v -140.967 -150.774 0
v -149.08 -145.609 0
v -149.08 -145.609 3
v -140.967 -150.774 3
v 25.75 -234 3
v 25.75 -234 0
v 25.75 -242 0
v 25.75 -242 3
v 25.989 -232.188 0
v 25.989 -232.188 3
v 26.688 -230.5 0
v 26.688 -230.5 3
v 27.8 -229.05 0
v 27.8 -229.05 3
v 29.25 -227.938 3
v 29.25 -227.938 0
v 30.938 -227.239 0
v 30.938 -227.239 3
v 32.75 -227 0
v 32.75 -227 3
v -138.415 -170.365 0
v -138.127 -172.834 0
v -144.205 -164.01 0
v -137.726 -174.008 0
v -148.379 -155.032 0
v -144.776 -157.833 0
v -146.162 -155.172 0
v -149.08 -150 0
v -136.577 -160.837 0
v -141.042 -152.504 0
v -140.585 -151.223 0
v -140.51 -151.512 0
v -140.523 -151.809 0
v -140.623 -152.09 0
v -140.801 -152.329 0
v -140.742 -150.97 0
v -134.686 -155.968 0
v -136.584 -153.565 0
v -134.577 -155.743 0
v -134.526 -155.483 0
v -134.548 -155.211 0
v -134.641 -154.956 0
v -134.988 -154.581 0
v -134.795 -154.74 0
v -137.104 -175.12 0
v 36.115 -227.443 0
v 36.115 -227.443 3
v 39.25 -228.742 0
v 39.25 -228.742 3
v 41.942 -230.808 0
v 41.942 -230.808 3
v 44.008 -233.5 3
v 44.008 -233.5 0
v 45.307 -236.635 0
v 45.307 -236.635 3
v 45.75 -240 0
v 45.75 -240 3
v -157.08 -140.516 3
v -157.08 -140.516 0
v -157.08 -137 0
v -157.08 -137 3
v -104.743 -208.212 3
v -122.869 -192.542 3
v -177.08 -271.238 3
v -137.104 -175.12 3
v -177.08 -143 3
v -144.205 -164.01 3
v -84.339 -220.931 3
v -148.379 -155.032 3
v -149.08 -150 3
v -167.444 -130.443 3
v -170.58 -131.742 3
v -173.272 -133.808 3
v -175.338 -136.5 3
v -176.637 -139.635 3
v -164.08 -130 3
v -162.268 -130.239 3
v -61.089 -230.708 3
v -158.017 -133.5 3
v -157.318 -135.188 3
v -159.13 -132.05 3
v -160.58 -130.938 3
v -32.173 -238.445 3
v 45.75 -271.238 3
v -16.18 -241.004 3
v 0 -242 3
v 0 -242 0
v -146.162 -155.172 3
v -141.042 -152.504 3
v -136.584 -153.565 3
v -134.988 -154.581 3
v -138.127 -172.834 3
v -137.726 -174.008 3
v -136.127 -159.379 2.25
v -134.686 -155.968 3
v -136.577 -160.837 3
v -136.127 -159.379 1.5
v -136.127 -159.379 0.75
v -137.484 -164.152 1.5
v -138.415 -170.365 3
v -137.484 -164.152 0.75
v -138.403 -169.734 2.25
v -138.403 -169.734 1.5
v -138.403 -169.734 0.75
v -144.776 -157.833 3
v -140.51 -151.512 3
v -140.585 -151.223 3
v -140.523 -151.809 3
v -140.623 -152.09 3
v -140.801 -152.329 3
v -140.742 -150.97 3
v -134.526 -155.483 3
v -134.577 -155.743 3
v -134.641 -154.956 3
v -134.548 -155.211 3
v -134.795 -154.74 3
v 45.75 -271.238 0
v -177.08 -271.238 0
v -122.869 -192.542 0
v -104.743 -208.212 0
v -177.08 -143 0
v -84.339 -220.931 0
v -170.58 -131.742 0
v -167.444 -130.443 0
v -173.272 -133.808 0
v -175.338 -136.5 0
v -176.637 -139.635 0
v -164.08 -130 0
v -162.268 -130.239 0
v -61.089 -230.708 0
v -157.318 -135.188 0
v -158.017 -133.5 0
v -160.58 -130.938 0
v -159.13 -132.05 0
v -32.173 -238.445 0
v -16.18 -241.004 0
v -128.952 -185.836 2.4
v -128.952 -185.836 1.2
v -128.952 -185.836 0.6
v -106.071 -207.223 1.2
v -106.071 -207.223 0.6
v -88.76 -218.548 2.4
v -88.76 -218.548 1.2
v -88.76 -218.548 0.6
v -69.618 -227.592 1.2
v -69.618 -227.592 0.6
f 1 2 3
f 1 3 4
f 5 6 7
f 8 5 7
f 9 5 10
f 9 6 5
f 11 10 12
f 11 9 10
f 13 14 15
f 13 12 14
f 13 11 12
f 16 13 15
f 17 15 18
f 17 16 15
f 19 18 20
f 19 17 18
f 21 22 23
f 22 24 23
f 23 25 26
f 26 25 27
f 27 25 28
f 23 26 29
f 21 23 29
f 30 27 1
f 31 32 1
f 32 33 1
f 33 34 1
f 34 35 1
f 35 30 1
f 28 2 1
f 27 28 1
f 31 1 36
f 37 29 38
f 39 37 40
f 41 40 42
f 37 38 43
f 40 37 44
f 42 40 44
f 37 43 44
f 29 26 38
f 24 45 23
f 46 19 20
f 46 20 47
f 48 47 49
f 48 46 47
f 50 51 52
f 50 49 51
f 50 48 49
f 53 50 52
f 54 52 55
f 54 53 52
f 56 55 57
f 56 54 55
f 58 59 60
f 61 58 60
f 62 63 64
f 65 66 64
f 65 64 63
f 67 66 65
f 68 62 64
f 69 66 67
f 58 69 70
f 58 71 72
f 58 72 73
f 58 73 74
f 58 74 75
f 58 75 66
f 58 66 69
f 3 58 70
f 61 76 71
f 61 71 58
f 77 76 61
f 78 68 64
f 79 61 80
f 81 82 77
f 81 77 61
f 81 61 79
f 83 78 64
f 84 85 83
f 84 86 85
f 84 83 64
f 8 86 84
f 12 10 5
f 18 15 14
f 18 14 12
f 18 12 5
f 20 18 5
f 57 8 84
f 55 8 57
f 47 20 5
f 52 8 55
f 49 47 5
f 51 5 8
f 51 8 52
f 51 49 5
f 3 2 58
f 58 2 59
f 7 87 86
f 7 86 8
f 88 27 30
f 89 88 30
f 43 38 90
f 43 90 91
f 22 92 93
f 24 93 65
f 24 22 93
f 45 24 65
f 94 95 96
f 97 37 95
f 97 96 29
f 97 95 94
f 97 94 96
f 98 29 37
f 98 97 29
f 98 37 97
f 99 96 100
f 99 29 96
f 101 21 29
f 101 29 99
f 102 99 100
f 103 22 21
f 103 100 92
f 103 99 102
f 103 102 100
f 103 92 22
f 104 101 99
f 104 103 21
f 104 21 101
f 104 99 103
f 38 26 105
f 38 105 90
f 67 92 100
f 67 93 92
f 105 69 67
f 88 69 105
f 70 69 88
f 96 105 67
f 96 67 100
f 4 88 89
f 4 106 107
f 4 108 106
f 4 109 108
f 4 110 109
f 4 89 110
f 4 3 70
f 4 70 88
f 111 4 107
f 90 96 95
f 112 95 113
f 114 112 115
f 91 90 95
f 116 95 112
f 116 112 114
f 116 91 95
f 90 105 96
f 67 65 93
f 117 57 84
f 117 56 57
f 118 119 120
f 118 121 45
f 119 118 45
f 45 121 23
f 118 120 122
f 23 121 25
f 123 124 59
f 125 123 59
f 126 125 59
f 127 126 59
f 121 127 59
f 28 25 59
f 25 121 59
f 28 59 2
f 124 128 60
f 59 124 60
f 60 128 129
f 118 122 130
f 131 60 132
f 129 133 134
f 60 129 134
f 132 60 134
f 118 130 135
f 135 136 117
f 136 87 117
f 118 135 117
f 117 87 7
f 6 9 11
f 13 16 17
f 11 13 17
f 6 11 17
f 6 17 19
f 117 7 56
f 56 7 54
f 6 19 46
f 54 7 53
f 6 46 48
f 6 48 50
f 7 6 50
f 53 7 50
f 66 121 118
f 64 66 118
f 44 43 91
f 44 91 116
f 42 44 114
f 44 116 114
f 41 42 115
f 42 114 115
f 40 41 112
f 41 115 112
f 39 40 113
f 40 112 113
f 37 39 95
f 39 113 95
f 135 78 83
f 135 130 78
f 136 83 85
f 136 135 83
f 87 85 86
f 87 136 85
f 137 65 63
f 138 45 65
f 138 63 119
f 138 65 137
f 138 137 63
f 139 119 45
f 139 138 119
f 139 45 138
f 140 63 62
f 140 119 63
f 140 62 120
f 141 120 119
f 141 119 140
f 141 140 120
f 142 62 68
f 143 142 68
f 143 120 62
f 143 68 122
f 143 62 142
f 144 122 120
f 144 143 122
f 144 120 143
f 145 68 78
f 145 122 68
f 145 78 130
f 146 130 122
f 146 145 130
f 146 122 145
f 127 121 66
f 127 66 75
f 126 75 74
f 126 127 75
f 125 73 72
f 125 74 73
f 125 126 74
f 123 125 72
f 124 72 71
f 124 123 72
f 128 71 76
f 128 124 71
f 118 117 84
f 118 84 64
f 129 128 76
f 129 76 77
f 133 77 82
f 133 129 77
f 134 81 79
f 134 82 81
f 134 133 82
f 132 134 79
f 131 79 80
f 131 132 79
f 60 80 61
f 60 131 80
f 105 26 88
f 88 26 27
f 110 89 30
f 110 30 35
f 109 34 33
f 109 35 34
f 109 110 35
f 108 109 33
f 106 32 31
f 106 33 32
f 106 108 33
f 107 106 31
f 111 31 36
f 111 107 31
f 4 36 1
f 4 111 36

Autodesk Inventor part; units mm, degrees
ref_plane "YZ Plane" through (0, 0, 0) normal (1, 0, 0) x (0, 1, 0)
ref_plane "XZ Plane" through (0, 0, 0) normal (0, 1, 0) x (-1, 0, 0)
ref_plane "XY Plane" through (0, 0, 0) normal (0, 0, 1) x (1, 0, 0)
sketch "Sketch3" plane through (0, 0, 0) normal (0, 0, 1) x (1, 0, 0)
  circle A0 centre (368.0481, 50) radius 50 construction
  line L0 (368.0481, 0) -> (514.9541, 0) construction
  line L1 (368.0481, 50) -> (514.9541, 50) construction
  line L2 (368.0481, 100) -> (514.9541, 100) construction
  line L3 (368.0481, 50) -> (343.0481, 6.6987) construction
  line L4 (368.0481, 50) -> (324.7469, 25) construction
  line L5 (368.0481, 50) -> (324.7469, 75) construction
  line L6 (343.0481, 93.3013) -> (368.0481, 50) construction
  line L7 (393.0481, 93.3013) -> (368.0481, 50) construction
  line L8 (411.3494, 75) -> (368.0481, 50) construction
  line L9 (411.3494, 25) -> (368.0481, 50) construction
  line L10 (393.0481, 6.6987) -> (368.0481, 50) construction
  line L11 (368.0481, 0) -> (368.0481, 100) construction
  line L12 (418.0481, 50) -> (368.0481, 50) construction
  line L13 (341.8682, 0) -> (341.8682, 100) construction
  line L14 (315.6883, 0) -> (315.6883, 100) construction
  line L15 (289.5083, 0) -> (289.5083, 100) construction
  line L16 (263.3284, 0) -> (263.3284, 100) construction
  line L17 (237.1485, 0) -> (237.1485, 100) construction
  line L18 (210.9685, 0) -> (210.9685, 100) construction
  line L19 (184.7886, 0) -> (184.7886, 100) construction
  line L20 (158.6086, 0) -> (158.6086, 100) construction
  circle A1 centre (315.6883, 50) radius 50 construction
  circle A2 centre (341.8682, 50) radius 50 construction
  circle A3 centre (289.5083, 50) radius 50 construction
  circle A4 centre (263.3284, 50) radius 50 construction
  circle A5 centre (237.1485, 50) radius 50 construction
  circle A6 centre (210.9685, 50) radius 50 construction
  line L21 (393.0481, 6.6987) -> (514.9541, 6.6987) construction
  line L22 (411.3494, 25) -> (514.9541, 25) construction
  line L23 (411.3494, 75) -> (514.9541, 75) construction
  line L24 (411.3494, 75) -> (514.9541, 75) construction
  line L25 (393.0481, 93.3013) -> (514.9541, 93.3013) construction
  line L26 (358.9895, 75) -> (339.5083, 50) construction
  line L27 (339.5083, 50) -> (306.6297, 25) construction
  line L28 (306.6297, 25) -> (262.1485, 6.6987) construction
  line L29 (262.1485, 6.6987) -> (210.9685, 0) construction
  line L30 (105.4843, -12.0642) -> (105.4843, 125.3083) construction
  line L31 (25.75, 0) -> (25.75, 23)
  line L32 (45.75, 17) -> (45.75, -21.2379)
  arc A7 (32.75, 30) -> (25.75, 23) centre (32.75, 23) ccw
  arc A8 (45.75, 17) -> (32.75, 30) centre (32.75, 17) ccw
  line L33 (32.75, 17) -> (45.75, 17) construction
  line L34 (32.75, 17) -> (32.75, 30) construction
  arc A9 (0, 0) -> (8.875, -12.2379) centre (12.875, 0) ccw
  arc A10 (16.875, -12.2379) -> (25.75, 0) centre (12.875, 0) ccw
  line L35 (45.75, -21.2379) -> (16.875, -21.2379)
  line L36 (8.875, -21.2379) -> (-177.0796, -21.2379)
  circle A11 centre (-144.2046, 110.3653) radius 12.875 construction
  line L37 (8.875, -21.2379) -> (8.875, -12.2379)
  line L38 (16.875, -21.2379) -> (16.875, -12.2379)
  line L39 (411.3494, 75) -> (158.6086, 75) construction
  line L40 (368.0481, 100) -> (158.6086, 100) construction
  line L41 (418.0481, 50) -> (158.6086, 50) construction
  line L42 (411.3494, 25) -> (158.6086, 25) construction
  line L43 (393.0481, 6.6987) -> (158.6086, 6.6987) construction
  line L44 (393.0481, 93.3013) -> (158.6086, 93.3013) construction
  line L45 (358.9895, 75) -> (366.8682, 93.3013) construction
  line L46 (366.8682, 93.3013) -> (368.0481, 100) construction
  spline S0 degree 4 poles (-157.0796, 100) (-157.0796, 88.9946) (-147.011, 72.6811) (-131.8577, 48.7932) (-88.4777, 17.6268) (-50.0176, 3.937) (-18.8717, 0) (0, 0) knots 0 0 0 0 0 0.264547 0.457223 0.66608 1 1 1 1 1
  line L47 (-157.0796, 100) -> (-157.0796, 81.2146) construction
  line L48 (0, 0) -> (-42.8818, 0) construction
  line L49 (-157.0796, 100) -> (-157.0796, 113)
  line L50 (-144.2046, 110.3653) -> (-157.0796, 110.3653) construction
  line L51 (-147.6984, 94.0277) -> (-120.1158, 108.3975) construction
  line L52 (-157.0796, 100) -> (0, 0) construction
  circle A12 centre (-147.2046, 105.4197) radius 9.875 construction
  line L53 (-147.2046, 105.4197) -> (-157.0796, 105.4197) construction
  line L54 (-146.1623, 94.828) -> (-144.7762, 92.1674) construction
  line L55 (-144.7762, 92.1674) -> (-142.2689, 93.4736) construction
  line L56 (-177.0796, 107) -> (-177.0796, -21.2379)
  arc A13 (-157.0796, 113) -> (-164.0796, 120) centre (-164.0796, 113) ccw
  line L57 (-164.0796, 113) -> (-164.0796, 120) construction
  line L58 (-164.0796, 113) -> (-157.0796, 113) construction
  arc A14 (-164.0796, 120) -> (-177.0796, 107) centre (-164.0796, 107) ccw
  line L59 (-164.0796, 107) -> (-177.0796, 107) construction
  line L60 (-164.0796, 107) -> (-164.0796, 120) construction
  line L61 (-457.0796, 100) -> (-300, 0)
  line L62 (-757.0796, 100) -> (-757.0796, 76.4376)
  line L63 (-600, 0) -> (-652.3765, 0)
  spline S1 degree 4 poles (-757.0796, 76.4376) (-757.0796, 65.0585) (-753.7776, 47.1407) (-745.4013, 7.8331) (-693.0053, 2.4317) (-668.8587, 0) (-652.3765, 0) knots 0 0 0 0 0 0.348765 0.598765 1 1 1 1 1
  line L64 (-477.0796, 107) -> (-477.0796, -21.2379)
  arc A15 (-464.0796, 120) -> (-477.0796, 107) centre (-464.0796, 107) ccw
  arc A16 (-457.0796, 113) -> (-464.0796, 120) centre (-464.0796, 113) ccw
  line L65 (-457.0796, 100) -> (-457.0796, 113)
  circle A17 centre (-447.2046, 105.4197) radius 9.875 construction
  circle A18 centre (-444.2046, 110.3653) radius 12.875 construction
  line L66 (-457.0796, 100) -> (-300, 0) construction
  line L67 (-447.6984, 94.0277) -> (-420.1158, 108.3975) construction
  line L68 (-444.7762, 92.1674) -> (-442.2689, 93.4736) construction
  line L69 (-446.1623, 94.828) -> (-444.7762, 92.1674) construction
  line L70 (-291.125, -21.2379) -> (-477.0796, -21.2379)
  arc A19 (-300, 0) -> (-291.125, -12.2379) centre (-287.125, 0) ccw
  line L71 (-291.125, -21.2379) -> (-291.125, -12.2379)
  line L72 (-283.125, -21.2379) -> (-283.125, -12.2379)
  arc A20 (-283.125, -12.2379) -> (-274.25, 0) centre (-287.125, 0) ccw
  line L73 (-254.25, -21.2379) -> (-283.125, -21.2379)
  line L74 (-254.25, 17) -> (-254.25, -21.2379)
  line L75 (-274.25, 0) -> (-274.25, 23)
  arc A21 (-267.25, 30) -> (-274.25, 23) centre (-267.25, 23) ccw
  arc A22 (-254.25, 17) -> (-267.25, 30) centre (-267.25, 17) ccw
  line L76 (-777.0796, 107) -> (-777.0796, -21.2379)
  arc A23 (-764.0796, 120) -> (-777.0796, 107) centre (-764.0796, 107) ccw
  arc A24 (-757.0796, 113) -> (-764.0796, 120) centre (-764.0796, 113) ccw
  line L77 (-757.0796, 100) -> (-757.0796, 113)
  circle A25 centre (-747.2046, 105.4197) radius 9.875 construction
  circle A26 centre (-744.2046, 110.3653) radius 12.875 construction
  line L78 (-757.0796, 100) -> (-600, 0) construction
  line L79 (-747.6984, 94.0277) -> (-720.1158, 108.3975) construction
  line L80 (-744.7762, 92.1674) -> (-742.2689, 93.4736) construction
  line L81 (-746.1623, 94.828) -> (-744.7762, 92.1674) construction
  line L82 (-591.125, -21.2379) -> (-777.0796, -21.2379)
  arc A27 (-600, 0) -> (-591.125, -12.2379) centre (-587.125, 0) ccw
  line L83 (-591.125, -21.2379) -> (-591.125, -12.2379)
  line L84 (-583.125, -21.2379) -> (-583.125, -12.2379)
  arc A28 (-583.125, -12.2379) -> (-574.25, 0) centre (-587.125, 0) ccw
  line L85 (-554.25, -21.2379) -> (-583.125, -21.2379)
  line L86 (-554.25, 17) -> (-554.25, -21.2379)
  line L87 (-574.25, 0) -> (-574.25, 23)
  arc A29 (-567.25, 30) -> (-574.25, 23) centre (-567.25, 23) ccw
  arc A30 (-554.25, 17) -> (-567.25, 30) centre (-567.25, 17) ccw
  line L88 (32.75, -233) -> (45.75, -233) construction
  line L89 (32.75, -233) -> (32.75, -220) construction
  arc A31 (45.75, -233) -> (32.75, -220) centre (32.75, -233) ccw construction
  line L90 (25.75, -250) -> (25.75, -227) construction
  line L91 (45.75, -233) -> (45.75, -271.2379) construction
  arc A32 (16.875, -262.2379) -> (25.75, -250) centre (12.875, -250) ccw construction
  line L92 (45.75, -271.2379) -> (16.875, -271.2379) construction
  arc A33 (0, -250) -> (8.875, -262.2379) centre (12.875, -250) ccw construction
  arc A34 (32.75, -220) -> (25.75, -227) centre (32.75, -227) ccw construction
  line L93 (8.875, -271.2379) -> (-177.0796, -271.2379) construction
  line L94 (-157.0796, -150) -> (0, -250) construction
  spline S2 degree 4 poles (-157.0796, -150) (-157.0796, -161.0054) (-147.011, -177.3189) (-131.8577, -201.2068) (-88.4777, -232.3732) (-50.0176, -246.063) (-18.8717, -250) (0, -250) knots 0 0 0 0 0 0.264547 0.457223 0.66608 1 1 1 1 1 construction
  line L95 (-177.0796, -143) -> (-177.0796, -271.2379)
  line L96 (-146.1623, -155.172) -> (-144.7762, -157.8326) construction
  line L97 (-144.7762, -157.8326) -> (-142.2689, -156.5264) construction
  line L98 (-147.6984, -155.9723) -> (-120.1158, -141.6025) construction
  line L99 (-157.0796, -150) -> (-157.0796, -168.7854) construction
  line L100 (-147.2046, -144.5803) -> (-157.0796, -144.5803) construction
  line L101 (-144.2046, -139.6347) -> (-157.0796, -139.6347) construction
  circle A35 centre (-147.2046, -144.5803) radius 9.875 construction
  line L102 (0, -250) -> (-42.8818, -250) construction
  line L103 (16.875, -271.2379) -> (16.875, -262.2379) construction
  line L104 (8.875, -271.2379) -> (8.875, -262.2379) construction
  circle A36 centre (-144.2046, -139.6347) radius 12.875 construction
  line L105 (-164.0796, -143) -> (-177.0796, -143) construction
  line L106 (-157.0796, -150) -> (-157.0796, -137) construction
  line L107 (-164.0796, -137) -> (-157.0796, -137) construction
  arc A37 (-157.0796, -137) -> (-164.0796, -130) centre (-164.0796, -137) ccw
  line L108 (-164.0796, -137) -> (-164.0796, -130) construction
  line L109 (-164.0796, -143) -> (-164.0796, -130) construction
  arc A38 (-164.0796, -130) -> (-177.0796, -143) centre (-164.0796, -143) ccw
  arc A39 (32.75, -227) -> (25.75, -234) centre (32.75, -234) ccw
  line L110 (32.75, -234) -> (25.75, -234) construction
  line L111 (32.75, -234) -> (32.75, -227) construction
  line L112 (45.75, -271.2379) -> (-177.0796, -271.2379)
  arc A40 (45.75, -240) -> (32.75, -227) centre (32.75, -240) ccw
  line L113 (32.75, -240) -> (45.75, -240) construction
  line L114 (32.75, -240) -> (32.75, -227) construction
  line L115 (45.75, -240) -> (45.75, -271.2379)
  line L116 (0, -242) -> (25.75, -242)
  line L117 (25.75, -234) -> (25.75, -242)
  line L118 (-149.0796, -145.6094) -> (-149.0796, -150)
  line L119 (-149.0796, -145.6094) -> (-157.0796, -140.5164)
  line L120 (-157.0796, -140.5164) -> (-157.0796, -137)
  line L121 (57.9242, -250) -> (-50.1018, -250) construction
  spline S3 degree 4 poles (-149.0796, -150) (-149.0796, -154.1011) (-147.2668, -159.7716) (-135.8793, -178.0796) (-120.229, -197.0865) (-83.3361, -225.9308) (-47.2959, -235.9761) (-18.0598, -242) (0, -242) knots 0 0 0 0 0 0.173174 0.31592 0.488873 0.682943 1 1 1 1 1
  line L122 (-158.9844, -148.7874) -> (-160.5796, -147.7718) construction
  line L123 (-149.0796, -145.6094) -> (2.3304, -242) construction
  line L124 (-149.0796, -145.6094) -> (-139.5059, -151.7042)
  line L125 (-146.1623, -155.172) -> (-139.5059, -151.7042)
  line L126 (-144.7762, -157.8326) -> (-146.1623, -155.172)
  line L127 (-144.7762, -157.8326) -> (-136.5837, -153.5646)
  line L128 (-136.5837, -153.5646) -> (-134.053, -155.1756)
  line L129 (-136.5837, -153.5646) -> (-136.7042, -153.7538) construction
  line L130 (-134.053, -155.1756) -> (-134.1481, -155.3251) construction
  spline S4 degree 4 poles (-134.053, -155.1756) (-136.402, -157.5324) (-136.0845, -162.1219) (-140.7392, -169.8853) (-137.1035, -175.12) knots 0 0 0 0 0 1 1 1 1 1
  line L131 (-134.053, -155.1756) -> (-131.4385, -154.0999) construction
  line L132 (-254.25, -271.2379) -> (-477.0796, -271.2379)
  line L133 (-477.0796, -143) -> (-477.0796, -271.2379)
  arc A41 (-464.0796, -130) -> (-477.0796, -143) centre (-464.0796, -143) ccw
  arc A42 (-457.0796, -137) -> (-464.0796, -130) centre (-464.0796, -137) ccw
  line L134 (-457.0796, -140.5164) -> (-457.0796, -137)
  line L135 (-449.0796, -145.6094) -> (-457.0796, -140.5164)
  line L136 (-449.0796, -145.6094) -> (-439.5059, -151.7042)
  line L137 (-446.1623, -155.172) -> (-439.5059, -151.7042)
  line L138 (-444.7762, -157.8326) -> (-446.1623, -155.172)
  line L139 (-444.7762, -157.8326) -> (-436.5837, -153.5646)
  line L140 (-436.5837, -153.5646) -> (-434.053, -155.1756)
  line L141 (-449.0796, -145.6094) -> (-297.6696, -242) construction
  line L142 (-300, -242) -> (-274.25, -242)
  line L143 (-274.25, -234) -> (-274.25, -242)
  arc A43 (-267.25, -227) -> (-274.25, -234) centre (-267.25, -234) ccw
  arc A44 (-254.25, -240) -> (-267.25, -227) centre (-267.25, -240) ccw
  line L144 (-254.25, -240) -> (-254.25, -271.2379)
  circle A45 centre (-447.2046, -144.5803) radius 9.875 construction
  line L145 (-457.0796, -150) -> (-300, -250) construction
  circle A46 centre (-444.2046, -139.6347) radius 12.875 construction
  line L146 (-554.25, -271.2379) -> (-777.0796, -271.2379)
  line L147 (-777.0796, -143) -> (-777.0796, -271.2379)
  arc A47 (-764.0796, -130) -> (-777.0796, -143) centre (-764.0796, -143) ccw
  arc A48 (-757.0796, -137) -> (-764.0796, -130) centre (-764.0796, -137) ccw
  line L148 (-757.0796, -140.5164) -> (-757.0796, -137)
  line L149 (-749.0796, -145.6094) -> (-757.0796, -140.5164)
  line L150 (-749.0796, -145.6094) -> (-739.5059, -151.7042)
  line L151 (-746.1623, -155.172) -> (-739.5059, -151.7042)
  line L152 (-744.7762, -157.8326) -> (-746.1623, -155.172)
  line L153 (-744.7762, -157.8326) -> (-736.5837, -153.5646)
  line L154 (-736.5837, -153.5646) -> (-734.053, -155.1756)
  line L155 (-749.0796, -145.6094) -> (-597.6696, -242) construction
  line L156 (-600, -242) -> (-574.25, -242)
  line L157 (-574.25, -234) -> (-574.25, -242)
  arc A49 (-567.25, -227) -> (-574.25, -234) centre (-567.25, -234) ccw
  arc A50 (-554.25, -240) -> (-567.25, -227) centre (-567.25, -240) ccw
  line L158 (-554.25, -240) -> (-554.25, -271.2379)
  circle A51 centre (-747.2046, -144.5803) radius 9.875 construction
  line L159 (-757.0796, -150) -> (-600, -250) construction
  circle A52 centre (-744.2046, -139.6347) radius 12.875 construction
  line L160 (-297.6696, -242) -> (-434.053, -155.1756)
  spline S5 degree 4 poles (-757.0796, -173.5624) (-757.0796, -184.9415) (-753.7776, -202.8593) (-745.4013, -242.1669) (-693.0053, -247.5683) (-668.8587, -250) (-652.3765, -250) knots 0 0 0 0 0 0.348765 0.598765 1 1 1 1 1 construction
  line L161 (-757.0796, -150) -> (-757.0796, -173.5624)
  line L162 (-600, -250) -> (-652.3765, -250) construction
  line L163 (-600, -242) -> (-652.3765, -242)
  spline S6 degree 4 poles (-749.0796, -173.5624) (-749.0796, -183.7991) (-746.0176, -199.7502) (-737.9559, -236.335) (-690.8375, -239.2991) (-667.8077, -242) (-652.3765, -242) knots 0 0 0 0 0 0.346383 0.596383 1 1 1 1 1
  line L164 (-749.0796, -173.5624) -> (-749.0796, -170.035) construction
  spline S7 degree 3 poles (-734.053, -155.1756) (-737.3459, -159.7447) (-749.7015, -168.8593) (-748.818, -180.0805) knots 0 0 0 0 1 1 1 1
  point P0 (158.6086, 0)
  point P1 (-148.021, 75)
  point P2 (-128.5398, 50)
  point P3 (-95.6611, 25)
  point P4 (-51.1799, 6.6987)
  point P5 (-155.8997, 93.3013)
  point P6 (-753.2027, 48.1984)
  point P7 (-737.7866, 19.9116)
  point P8 (-697.6619, 3.8098)
  point P9 (-457.0796, 110.3653)
  point P10 (-457.0796, 105.4197)
  point P11 (-757.0796, 110.3653)
  point P12 (-757.0796, 105.4197)
  point P13 (-51.1799, -243.3013)
  point P14 (-95.6611, -225)
  point P15 (-148.021, -175)
  point P16 (-128.5398, -200)
  point P17 (-155.8997, -156.6987)
  point P18 (-157.0796, -141.4334)
  point P19 (-153.0796, -143.0629)
  point P20 (-152.1421, -144.5803)
  point P21 (3.9112, -250)
  point P22 (-147.2046, -158.2164)
  point P23 (-137.7547, -174.1759)
  point P24 (-121.904, -193.5196)
  point P25 (-91.5665, -216.9339)
  point P26 (-48.8291, -234.4712)
  point P27 (-135.7656, -158.3121)
  point P28 (-137.8276, -165.6332)
  point P29 (-453.0796, -143.0629)
  point P30 (-457.0796, -144.5803)
  point P31 (-447.6984, -155.9723)
  point P32 (-457.0796, -139.6347)
  point P33 (-753.0796, -143.0629)
  point P34 (-757.0796, -144.5803)
  point P35 (-747.6984, -155.9723)
  point P36 (-757.0796, -139.6347)
  point P37 (-753.2027, -201.8016)
  point P38 (-737.7866, -230.0884)
  point P39 (-697.6619, -246.1902)
  point P40 (-745.4939, -198.9007)
  point P41 (-731.3987, -224.5882)
  point P42 (-695.3384, -238.4632)
  point P43 (-741.9708, -163.8819)
  dimension "d43" = 25.75
  dimension "d53" = 19.75
  dimension "diameter" = 100
  dimension "d8" = 26.1799
  dimension "d14" = 30
  dimension "d15" = 30
  dimension "d16" = 30
  dimension "d26" = 90
  dimension "stopper" = 30
  dimension "stopperthickness" = 20
  dimension "d32" = 12.875
  dimension "d33" = 12.875
  dimension "d38" = 6
  dimension "d47" = 8
  dimension "d49" = 9
  dimension "d55" = 120
  dimension "d56" = 3
  dimension "d57" = 90
  dimension "d58" = 90
  dimension "d59" = 20
  dimension "d60" = 6
  dimension "d61" = 20
  dimension "d62" = 28.875
  dimension "d72" = 300
  dimension "d93" = 250
  dimension "d98" = 90
  dimension "d99" = 44.2379
  dimension "d100" = 37.2379
  dimension "d101" = 90
  dimension "railheight" = 8
  dimension "d104" = 8
  dimension "d105" = 8
  dimension "d106" = 3
  dimension "d109" = 300
  dimension "d116" = 250
  dimension "d121" = 8
extrude "Extrusion1" add sketch "Sketch3" along normal blind 3 contours A38 A37 L120 L119 L118 S3 L116 L117 A39 A40 L115 L112 L95 | L124 L125 L126 L127 L128 S4 S3 L118
fillet "Fillet1" radius 1 2 edges at (-139.5059, -151.7042, 1.5) (-134.053, -155.1756, 1.5)
equation "\"d8\" = 0.261799 * diameter"
properties part number "cyloid-rail"
